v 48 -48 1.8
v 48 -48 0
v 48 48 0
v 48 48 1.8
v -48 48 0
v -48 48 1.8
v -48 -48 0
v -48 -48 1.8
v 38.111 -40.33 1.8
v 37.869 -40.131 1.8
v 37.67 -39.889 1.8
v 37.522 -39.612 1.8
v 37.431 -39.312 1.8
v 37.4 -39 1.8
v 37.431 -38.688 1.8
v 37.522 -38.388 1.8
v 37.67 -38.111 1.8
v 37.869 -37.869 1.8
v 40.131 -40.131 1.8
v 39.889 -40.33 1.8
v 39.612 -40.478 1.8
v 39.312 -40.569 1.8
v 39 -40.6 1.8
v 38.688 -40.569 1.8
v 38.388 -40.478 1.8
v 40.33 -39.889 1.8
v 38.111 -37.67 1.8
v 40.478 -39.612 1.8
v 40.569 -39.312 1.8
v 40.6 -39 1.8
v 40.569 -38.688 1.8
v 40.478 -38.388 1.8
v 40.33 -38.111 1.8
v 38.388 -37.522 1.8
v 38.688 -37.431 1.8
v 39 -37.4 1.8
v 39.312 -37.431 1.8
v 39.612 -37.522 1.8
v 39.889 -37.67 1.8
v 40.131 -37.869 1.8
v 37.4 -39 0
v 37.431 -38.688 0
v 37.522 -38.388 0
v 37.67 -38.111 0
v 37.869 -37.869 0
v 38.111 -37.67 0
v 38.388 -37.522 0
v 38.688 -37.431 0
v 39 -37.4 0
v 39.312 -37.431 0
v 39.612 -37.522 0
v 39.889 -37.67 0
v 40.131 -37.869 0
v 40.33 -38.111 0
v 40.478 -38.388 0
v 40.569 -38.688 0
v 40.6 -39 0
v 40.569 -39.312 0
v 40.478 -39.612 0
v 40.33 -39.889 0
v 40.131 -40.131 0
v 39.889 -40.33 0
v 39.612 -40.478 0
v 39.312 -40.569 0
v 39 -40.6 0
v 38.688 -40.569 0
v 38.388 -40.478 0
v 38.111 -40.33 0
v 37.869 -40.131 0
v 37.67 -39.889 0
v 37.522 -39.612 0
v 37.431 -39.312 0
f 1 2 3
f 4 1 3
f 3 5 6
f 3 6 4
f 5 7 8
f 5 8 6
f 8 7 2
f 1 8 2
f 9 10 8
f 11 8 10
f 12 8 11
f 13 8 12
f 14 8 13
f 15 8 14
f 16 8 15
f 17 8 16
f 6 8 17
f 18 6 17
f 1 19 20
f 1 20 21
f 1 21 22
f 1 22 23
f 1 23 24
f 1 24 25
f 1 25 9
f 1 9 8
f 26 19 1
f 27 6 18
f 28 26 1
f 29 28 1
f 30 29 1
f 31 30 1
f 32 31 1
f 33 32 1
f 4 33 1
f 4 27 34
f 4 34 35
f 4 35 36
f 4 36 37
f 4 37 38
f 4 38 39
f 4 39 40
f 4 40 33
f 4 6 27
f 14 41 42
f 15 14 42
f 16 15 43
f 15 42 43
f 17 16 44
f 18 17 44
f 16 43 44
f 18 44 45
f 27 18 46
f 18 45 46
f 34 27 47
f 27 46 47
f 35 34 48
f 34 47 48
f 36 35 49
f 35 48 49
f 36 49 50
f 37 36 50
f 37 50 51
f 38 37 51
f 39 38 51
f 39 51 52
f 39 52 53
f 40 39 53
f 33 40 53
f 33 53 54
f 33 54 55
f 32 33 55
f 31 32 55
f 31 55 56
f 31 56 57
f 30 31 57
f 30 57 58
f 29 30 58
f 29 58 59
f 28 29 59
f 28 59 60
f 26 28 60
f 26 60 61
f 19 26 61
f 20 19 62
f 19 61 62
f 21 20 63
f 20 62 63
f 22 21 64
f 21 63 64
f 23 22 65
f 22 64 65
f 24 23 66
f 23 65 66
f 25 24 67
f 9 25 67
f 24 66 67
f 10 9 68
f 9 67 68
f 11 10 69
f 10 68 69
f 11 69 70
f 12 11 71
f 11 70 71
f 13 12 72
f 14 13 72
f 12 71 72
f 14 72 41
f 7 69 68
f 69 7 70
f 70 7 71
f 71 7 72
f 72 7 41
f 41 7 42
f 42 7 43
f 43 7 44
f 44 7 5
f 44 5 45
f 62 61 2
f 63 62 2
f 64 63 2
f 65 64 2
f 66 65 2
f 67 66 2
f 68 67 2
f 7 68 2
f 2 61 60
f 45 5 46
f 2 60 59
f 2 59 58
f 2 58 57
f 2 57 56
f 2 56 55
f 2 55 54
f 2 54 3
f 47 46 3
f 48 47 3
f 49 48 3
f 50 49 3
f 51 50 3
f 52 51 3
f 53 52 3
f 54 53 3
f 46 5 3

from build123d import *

# Parameters (mm, degrees)
SKETCH1_W                  = 96
SKETCH1_H                  = 96
BOSS_EXTRUDE1_DEPTH        = 1.8
F_3_2_3_2_DIAMETER_HOLE1_D = 3.2


with BuildPart() as part:
    # Sketch1 → Boss-Extrude1 (new body)
    with BuildSketch(Plane.XY):
        Rectangle(SKETCH1_W, SKETCH1_H)
    extrude(amount=BOSS_EXTRUDE1_DEPTH)

    # Ø3.2 (3.2) Diameter Hole1 (through all)
    with Locations(Plane.XY.offset(1.8)):
        with Locations((39, -39)):
            Hole(F_3_2_3_2_DIAMETER_HOLE1_D / 2)


solid = part.part
